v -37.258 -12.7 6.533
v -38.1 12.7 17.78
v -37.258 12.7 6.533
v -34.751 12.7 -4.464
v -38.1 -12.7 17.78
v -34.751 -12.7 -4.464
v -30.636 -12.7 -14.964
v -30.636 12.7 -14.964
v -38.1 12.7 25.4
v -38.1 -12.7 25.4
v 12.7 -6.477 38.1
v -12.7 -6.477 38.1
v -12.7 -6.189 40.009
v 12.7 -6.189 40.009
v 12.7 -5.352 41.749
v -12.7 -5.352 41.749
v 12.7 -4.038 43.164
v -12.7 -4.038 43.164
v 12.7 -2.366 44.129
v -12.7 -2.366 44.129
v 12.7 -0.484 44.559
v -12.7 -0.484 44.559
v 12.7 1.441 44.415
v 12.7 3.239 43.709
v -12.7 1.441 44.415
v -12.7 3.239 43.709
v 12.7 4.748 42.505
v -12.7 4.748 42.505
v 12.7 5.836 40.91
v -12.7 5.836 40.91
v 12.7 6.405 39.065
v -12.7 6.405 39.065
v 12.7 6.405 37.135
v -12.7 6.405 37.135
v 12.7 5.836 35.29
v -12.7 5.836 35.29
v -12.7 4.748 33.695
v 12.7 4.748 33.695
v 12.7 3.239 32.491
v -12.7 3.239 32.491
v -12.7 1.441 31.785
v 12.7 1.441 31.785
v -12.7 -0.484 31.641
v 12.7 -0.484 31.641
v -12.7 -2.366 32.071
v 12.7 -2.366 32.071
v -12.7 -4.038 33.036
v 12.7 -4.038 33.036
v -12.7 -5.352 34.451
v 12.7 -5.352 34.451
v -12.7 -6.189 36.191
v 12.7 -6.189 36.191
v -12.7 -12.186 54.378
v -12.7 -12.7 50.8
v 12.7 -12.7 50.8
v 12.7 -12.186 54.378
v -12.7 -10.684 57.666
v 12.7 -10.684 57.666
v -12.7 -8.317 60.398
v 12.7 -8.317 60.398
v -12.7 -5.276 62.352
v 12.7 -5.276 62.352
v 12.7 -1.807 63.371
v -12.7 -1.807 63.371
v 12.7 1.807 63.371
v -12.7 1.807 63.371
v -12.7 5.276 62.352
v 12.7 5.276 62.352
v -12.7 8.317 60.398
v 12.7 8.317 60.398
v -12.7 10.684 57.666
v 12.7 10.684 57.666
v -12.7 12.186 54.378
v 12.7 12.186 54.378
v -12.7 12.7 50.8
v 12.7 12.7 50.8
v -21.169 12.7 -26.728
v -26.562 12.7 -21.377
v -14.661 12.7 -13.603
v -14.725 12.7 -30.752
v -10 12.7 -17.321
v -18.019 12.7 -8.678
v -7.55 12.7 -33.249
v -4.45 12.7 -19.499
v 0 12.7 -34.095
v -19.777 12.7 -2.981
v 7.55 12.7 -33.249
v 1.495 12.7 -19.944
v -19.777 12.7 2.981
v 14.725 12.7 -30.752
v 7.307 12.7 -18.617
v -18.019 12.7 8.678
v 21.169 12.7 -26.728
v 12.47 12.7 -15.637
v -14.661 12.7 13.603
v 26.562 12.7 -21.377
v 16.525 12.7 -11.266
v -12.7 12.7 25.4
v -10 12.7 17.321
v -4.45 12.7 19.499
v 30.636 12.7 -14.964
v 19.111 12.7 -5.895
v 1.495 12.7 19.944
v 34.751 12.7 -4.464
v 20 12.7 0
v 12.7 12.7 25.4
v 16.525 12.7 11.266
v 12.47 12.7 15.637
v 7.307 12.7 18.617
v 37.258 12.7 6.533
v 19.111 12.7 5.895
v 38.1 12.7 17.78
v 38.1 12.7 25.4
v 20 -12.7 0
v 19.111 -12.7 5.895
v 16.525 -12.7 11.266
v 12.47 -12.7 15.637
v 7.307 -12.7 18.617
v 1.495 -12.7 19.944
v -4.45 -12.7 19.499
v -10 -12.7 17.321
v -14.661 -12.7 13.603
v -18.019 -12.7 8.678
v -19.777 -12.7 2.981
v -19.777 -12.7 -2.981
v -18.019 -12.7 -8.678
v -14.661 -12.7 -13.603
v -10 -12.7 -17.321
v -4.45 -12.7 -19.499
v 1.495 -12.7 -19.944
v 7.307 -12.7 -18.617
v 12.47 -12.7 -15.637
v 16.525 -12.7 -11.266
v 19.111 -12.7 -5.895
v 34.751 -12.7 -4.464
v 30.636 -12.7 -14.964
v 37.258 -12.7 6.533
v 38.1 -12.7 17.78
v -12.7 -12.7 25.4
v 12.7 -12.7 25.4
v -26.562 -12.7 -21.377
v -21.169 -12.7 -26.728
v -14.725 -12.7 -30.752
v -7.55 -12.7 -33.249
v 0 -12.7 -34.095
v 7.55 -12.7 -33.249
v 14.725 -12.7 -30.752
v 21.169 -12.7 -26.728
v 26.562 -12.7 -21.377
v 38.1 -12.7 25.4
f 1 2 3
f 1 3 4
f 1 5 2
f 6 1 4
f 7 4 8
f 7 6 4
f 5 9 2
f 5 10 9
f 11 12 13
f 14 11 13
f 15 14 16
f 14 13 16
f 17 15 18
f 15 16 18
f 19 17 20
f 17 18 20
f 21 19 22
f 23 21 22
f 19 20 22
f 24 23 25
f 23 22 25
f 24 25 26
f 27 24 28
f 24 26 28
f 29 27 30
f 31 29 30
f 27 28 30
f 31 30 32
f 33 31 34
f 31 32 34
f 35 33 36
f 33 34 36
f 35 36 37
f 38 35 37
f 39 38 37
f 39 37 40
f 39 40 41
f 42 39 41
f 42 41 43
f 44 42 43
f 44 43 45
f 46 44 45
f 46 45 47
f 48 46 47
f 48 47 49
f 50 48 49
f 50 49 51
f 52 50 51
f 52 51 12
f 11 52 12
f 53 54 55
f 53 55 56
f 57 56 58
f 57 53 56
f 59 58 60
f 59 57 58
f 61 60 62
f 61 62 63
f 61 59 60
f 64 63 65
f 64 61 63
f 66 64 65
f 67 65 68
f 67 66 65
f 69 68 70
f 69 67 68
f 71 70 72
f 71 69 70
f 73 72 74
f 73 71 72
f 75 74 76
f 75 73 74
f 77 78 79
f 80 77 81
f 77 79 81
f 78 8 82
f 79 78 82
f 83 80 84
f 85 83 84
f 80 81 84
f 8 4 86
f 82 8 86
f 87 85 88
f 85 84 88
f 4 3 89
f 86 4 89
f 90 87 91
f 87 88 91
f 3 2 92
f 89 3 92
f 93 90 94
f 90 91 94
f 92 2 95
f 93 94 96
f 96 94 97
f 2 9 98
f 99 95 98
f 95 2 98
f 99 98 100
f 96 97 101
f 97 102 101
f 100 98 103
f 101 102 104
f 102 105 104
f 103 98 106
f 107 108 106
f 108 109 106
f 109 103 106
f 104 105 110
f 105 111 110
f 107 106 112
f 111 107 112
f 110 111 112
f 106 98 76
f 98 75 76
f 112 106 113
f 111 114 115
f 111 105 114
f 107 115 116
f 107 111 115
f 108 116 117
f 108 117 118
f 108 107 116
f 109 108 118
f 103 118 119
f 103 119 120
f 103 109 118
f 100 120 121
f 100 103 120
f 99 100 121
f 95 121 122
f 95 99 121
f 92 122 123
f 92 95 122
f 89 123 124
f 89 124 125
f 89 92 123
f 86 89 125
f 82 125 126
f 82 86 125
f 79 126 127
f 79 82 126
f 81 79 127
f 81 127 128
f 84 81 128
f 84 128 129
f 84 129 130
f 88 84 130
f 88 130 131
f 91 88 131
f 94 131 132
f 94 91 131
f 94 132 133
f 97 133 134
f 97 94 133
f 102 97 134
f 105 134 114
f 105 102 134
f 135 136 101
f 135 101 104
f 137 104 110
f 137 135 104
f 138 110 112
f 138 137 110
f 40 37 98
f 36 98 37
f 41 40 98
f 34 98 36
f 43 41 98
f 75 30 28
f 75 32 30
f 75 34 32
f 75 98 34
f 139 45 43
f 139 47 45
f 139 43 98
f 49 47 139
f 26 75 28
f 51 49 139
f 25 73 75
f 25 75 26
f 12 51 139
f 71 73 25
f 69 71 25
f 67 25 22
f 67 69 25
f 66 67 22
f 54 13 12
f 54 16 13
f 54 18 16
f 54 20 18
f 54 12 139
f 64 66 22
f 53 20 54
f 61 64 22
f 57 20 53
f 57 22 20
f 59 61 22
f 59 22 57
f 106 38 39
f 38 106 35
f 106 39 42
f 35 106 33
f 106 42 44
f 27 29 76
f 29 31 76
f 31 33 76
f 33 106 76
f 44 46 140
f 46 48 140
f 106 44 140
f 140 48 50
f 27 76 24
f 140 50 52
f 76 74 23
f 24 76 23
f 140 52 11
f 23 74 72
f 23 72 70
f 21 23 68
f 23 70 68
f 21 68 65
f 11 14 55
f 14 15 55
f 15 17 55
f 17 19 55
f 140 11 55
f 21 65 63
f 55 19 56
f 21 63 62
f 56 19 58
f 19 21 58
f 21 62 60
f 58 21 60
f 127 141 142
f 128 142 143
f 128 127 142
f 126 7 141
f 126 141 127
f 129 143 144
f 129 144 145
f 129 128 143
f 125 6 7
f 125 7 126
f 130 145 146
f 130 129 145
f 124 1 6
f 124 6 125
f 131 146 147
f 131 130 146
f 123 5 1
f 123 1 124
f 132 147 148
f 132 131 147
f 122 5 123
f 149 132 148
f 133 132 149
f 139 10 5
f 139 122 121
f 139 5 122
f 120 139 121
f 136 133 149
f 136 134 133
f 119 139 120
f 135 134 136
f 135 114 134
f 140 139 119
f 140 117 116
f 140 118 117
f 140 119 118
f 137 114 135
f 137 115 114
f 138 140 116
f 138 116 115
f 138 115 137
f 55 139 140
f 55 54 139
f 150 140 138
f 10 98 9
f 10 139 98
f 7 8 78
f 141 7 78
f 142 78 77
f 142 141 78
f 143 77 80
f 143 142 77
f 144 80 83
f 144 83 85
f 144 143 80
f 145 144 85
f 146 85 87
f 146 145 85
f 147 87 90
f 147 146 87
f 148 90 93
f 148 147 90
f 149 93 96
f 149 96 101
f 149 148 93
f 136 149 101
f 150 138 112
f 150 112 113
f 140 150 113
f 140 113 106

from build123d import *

# Parameters (mm, degrees)
F0_R     = 20
F1_DEPTH = 12.7
F2_R     = 6.477
F3_DEPTH = 50.801
F4_DEPTH = 25.4


with BuildPart() as f1:
    # F0 (on Front) → F1 (new body, symmetric)
    with BuildSketch(Plane.XZ):
        with BuildLine():
            ThreePointArc((-38.1, 17.78), (-36.210287, 0.987833), (-30.635678, -14.964333))
            ThreePointArc((-30.635678, -14.964333), (0, -34.095103), (30.635678, -14.964333))
            ThreePointArc((30.635678, -14.964333), (36.210287, 0.987833), (38.1, 17.78))
            Line((38.1, 17.78), (38.1, 25.4))
            Line((38.1, 25.4), (12.7, 25.4))
            Line((12.7, 25.4), (12.7, 50.8))
            Line((12.7, 50.8), (-12.7, 50.8))
            Line((-12.7, 50.8), (-12.7, 25.4))
            Line((-12.7, 25.4), (-38.1, 25.4))
            Line((-38.1, 25.4), (-38.1, 17.78))
        make_face()
        Circle(F0_R, mode=Mode.SUBTRACT)
    extrude(amount=F1_DEPTH, both=True)

    # F2 (on face) → F3 (cut, through all)
    with BuildSketch(Plane(origin=(-12.7, 0, 0), x_dir=(0, -1, 0), z_dir=(-1, 0, 0))):
        with Locations((0, 38.1)):
            Circle(F2_R)
    extrude(amount=-F3_DEPTH, mode=Mode.SUBTRACT)

    # F2 (on face) → F4 (join)
    with BuildSketch(Plane(origin=(-12.7, 0, 0), x_dir=(0, -1, 0), z_dir=(-1, 0, 0))):
        with BuildLine():
            Line((-12.7, 50.8), (12.7, 50.8))
            ThreePointArc((12.7, 50.8), (0, 63.5), (-12.7, 50.8))
        make_face()
    extrude(amount=-F4_DEPTH)


solid = f1.part
